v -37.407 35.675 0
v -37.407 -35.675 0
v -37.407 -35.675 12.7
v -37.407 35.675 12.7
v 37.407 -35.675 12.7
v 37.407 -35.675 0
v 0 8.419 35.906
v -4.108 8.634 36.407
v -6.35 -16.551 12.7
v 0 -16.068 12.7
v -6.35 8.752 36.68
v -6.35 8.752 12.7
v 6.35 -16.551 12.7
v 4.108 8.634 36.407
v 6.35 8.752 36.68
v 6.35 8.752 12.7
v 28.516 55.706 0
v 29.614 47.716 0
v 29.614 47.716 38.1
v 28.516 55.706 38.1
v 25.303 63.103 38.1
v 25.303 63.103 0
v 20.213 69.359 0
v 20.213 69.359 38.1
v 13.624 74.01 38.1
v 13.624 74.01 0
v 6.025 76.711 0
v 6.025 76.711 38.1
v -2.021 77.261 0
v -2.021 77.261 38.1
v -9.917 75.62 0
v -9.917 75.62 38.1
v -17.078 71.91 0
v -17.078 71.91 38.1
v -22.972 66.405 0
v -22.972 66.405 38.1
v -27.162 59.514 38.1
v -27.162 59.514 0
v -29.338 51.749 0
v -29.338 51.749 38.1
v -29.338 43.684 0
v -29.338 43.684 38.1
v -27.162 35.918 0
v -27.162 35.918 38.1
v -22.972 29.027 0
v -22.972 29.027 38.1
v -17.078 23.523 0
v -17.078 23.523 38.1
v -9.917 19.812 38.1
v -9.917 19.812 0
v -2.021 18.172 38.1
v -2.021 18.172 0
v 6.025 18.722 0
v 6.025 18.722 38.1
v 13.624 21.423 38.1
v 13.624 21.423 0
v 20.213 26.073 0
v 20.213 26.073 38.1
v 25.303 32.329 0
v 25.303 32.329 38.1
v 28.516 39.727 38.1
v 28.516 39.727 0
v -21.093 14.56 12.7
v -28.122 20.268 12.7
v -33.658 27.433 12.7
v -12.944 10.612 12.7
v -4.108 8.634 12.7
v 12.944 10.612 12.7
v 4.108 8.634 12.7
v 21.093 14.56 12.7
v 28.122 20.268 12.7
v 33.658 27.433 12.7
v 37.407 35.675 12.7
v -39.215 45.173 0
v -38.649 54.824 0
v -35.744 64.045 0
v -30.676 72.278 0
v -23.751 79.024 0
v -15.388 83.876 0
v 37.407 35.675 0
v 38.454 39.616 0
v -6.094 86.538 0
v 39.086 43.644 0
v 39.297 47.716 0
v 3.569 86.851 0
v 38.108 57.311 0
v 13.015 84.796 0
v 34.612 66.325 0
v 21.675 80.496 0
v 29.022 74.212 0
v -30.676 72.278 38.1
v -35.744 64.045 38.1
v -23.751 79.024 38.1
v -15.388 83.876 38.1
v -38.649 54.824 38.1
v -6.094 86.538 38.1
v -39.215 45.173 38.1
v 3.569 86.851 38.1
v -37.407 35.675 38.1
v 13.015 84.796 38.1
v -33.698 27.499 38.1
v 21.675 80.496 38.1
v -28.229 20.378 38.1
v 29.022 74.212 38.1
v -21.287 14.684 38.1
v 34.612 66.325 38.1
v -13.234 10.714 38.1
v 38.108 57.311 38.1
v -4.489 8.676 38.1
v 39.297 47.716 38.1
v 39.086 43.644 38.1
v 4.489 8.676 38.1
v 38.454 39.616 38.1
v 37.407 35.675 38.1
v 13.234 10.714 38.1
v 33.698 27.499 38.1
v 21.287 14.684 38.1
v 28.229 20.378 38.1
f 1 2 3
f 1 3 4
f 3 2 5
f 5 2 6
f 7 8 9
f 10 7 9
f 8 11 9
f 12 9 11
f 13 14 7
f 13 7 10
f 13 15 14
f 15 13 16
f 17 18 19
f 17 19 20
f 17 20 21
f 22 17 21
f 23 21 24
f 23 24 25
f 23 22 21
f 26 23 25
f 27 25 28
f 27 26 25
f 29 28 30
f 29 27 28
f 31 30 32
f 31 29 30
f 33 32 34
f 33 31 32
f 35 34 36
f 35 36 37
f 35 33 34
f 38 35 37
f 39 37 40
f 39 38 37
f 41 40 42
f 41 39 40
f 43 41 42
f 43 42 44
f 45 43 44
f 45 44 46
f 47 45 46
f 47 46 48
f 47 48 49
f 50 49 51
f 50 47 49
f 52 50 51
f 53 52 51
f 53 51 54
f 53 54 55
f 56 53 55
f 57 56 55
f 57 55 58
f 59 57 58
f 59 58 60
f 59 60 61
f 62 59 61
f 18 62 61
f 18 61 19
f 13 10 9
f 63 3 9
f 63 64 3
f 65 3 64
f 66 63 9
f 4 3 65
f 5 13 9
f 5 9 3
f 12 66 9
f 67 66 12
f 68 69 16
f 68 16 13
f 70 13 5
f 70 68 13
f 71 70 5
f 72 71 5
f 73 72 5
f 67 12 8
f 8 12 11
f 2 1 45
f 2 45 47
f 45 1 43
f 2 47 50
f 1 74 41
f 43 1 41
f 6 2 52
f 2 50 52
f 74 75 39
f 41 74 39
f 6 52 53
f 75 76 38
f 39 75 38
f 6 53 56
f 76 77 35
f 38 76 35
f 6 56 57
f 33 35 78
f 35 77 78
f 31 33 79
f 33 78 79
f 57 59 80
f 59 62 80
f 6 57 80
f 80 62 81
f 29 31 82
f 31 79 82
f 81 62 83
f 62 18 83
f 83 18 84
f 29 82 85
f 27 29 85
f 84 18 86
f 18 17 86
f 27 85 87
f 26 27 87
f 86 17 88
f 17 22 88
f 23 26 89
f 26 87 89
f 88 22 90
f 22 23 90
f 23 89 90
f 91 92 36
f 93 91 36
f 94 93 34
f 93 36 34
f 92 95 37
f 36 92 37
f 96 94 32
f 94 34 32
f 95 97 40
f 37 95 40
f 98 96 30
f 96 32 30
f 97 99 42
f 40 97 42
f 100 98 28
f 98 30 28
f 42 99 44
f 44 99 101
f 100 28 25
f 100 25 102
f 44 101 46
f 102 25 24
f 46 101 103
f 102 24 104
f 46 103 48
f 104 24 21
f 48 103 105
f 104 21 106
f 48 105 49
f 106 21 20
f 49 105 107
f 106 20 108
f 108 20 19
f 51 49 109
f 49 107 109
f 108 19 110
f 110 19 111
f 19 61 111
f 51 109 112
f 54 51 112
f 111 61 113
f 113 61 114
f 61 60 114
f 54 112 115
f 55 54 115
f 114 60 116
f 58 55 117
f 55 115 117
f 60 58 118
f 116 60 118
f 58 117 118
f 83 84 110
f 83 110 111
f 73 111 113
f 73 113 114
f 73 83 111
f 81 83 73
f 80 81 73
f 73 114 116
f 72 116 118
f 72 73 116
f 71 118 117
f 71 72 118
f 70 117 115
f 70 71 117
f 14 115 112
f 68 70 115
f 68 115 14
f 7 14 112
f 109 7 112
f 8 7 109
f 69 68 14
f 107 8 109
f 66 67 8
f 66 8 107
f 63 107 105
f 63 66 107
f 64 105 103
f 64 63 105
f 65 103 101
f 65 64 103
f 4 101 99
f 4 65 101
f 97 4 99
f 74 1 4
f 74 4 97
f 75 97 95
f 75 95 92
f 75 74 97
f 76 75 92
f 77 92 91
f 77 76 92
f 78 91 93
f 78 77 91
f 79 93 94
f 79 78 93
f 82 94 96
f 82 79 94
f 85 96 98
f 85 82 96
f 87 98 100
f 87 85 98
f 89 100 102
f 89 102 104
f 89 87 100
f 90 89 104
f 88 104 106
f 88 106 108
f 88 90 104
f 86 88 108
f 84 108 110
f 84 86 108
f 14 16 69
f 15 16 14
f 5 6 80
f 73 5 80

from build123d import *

# Parameters (mm, degrees)
F0_W     = 74.814543128
F0_H     = 71.3509097695
F1_DEPTH = 12.7
F3_DEPTH = 38.1
F4_DEPTH = 38.1
F6_DEPTH = 6.35
F6_TAPER = -3


with BuildPart() as f1:
    # F0 (on Top) → F1 (new body)
    with BuildSketch(Plane.XY):
        Rectangle(F0_W, F0_H)
    extrude(amount=F1_DEPTH)

    # F2 (on face) → F3 (join)
    with BuildSketch(Plane(origin=(0, 0, 0), x_dir=(1, 0, 0), z_dir=(0, 0, -1))):
        with BuildLine():
            Line((27.0553643694, -35.6754548848), (37.407271564, -35.6754548848))
            ThreePointArc((37.407271564, -35.6754548848), (0, -8.418886875), (-37.407271564, -35.6754548848))
            Line((-37.407271564, -35.6754548848), (-27.0553643694, -35.6754548848))
            ThreePointArc((-27.0553643694, -35.6754548848), (0, -18.1025332163), (27.0553643694, -35.6754548848))
        make_face()
        with BuildLine():
            ThreePointArc((-37.407271564, -35.6754548848), (-6.0941405685, -86.5382776277), (39.2973991584, -47.7162860334))
            ThreePointArc((39.2973991584, -47.7162860334), (38.8219915943, -41.6221454649), (37.407271564, -35.6754548848))
            Line((37.407271564, -35.6754548848), (27.0553643694, -35.6754548848))
            ThreePointArc((27.0553643694, -35.6754548848), (28.9670953732, -41.5614715317), (29.6137528171, -47.7162860334))
            ThreePointArc((29.6137528171, -47.7162860334), (-6.1548145016, -76.6833814066), (-27.0553643694, -35.6754548848))
            Line((-27.0553643694, -35.6754548848), (-37.407271564, -35.6754548848))
        make_face()
    extrude(amount=-F3_DEPTH)

    # F4 (cut, symmetric): a face of the model
    f4_faces = [f1.faces().sort_by_distance(p)[0] for p in [
        (0, 28.4298339612, 12.7),
    ]]
    extrude(f4_faces, amount=F4_DEPTH, both=True, mode=Mode.SUBTRACT)

    # F5 (on Right) → F6 (join, symmetric)
    with BuildSketch(Plane.YZ):
        Polygon((-16.0677041858, 12.7), (8.418886875, 12.7), (8.418886875, 35.9063632786), align=None)
    extrude(amount=F6_DEPTH, both=True, taper=F6_TAPER)


solid = f1.part
